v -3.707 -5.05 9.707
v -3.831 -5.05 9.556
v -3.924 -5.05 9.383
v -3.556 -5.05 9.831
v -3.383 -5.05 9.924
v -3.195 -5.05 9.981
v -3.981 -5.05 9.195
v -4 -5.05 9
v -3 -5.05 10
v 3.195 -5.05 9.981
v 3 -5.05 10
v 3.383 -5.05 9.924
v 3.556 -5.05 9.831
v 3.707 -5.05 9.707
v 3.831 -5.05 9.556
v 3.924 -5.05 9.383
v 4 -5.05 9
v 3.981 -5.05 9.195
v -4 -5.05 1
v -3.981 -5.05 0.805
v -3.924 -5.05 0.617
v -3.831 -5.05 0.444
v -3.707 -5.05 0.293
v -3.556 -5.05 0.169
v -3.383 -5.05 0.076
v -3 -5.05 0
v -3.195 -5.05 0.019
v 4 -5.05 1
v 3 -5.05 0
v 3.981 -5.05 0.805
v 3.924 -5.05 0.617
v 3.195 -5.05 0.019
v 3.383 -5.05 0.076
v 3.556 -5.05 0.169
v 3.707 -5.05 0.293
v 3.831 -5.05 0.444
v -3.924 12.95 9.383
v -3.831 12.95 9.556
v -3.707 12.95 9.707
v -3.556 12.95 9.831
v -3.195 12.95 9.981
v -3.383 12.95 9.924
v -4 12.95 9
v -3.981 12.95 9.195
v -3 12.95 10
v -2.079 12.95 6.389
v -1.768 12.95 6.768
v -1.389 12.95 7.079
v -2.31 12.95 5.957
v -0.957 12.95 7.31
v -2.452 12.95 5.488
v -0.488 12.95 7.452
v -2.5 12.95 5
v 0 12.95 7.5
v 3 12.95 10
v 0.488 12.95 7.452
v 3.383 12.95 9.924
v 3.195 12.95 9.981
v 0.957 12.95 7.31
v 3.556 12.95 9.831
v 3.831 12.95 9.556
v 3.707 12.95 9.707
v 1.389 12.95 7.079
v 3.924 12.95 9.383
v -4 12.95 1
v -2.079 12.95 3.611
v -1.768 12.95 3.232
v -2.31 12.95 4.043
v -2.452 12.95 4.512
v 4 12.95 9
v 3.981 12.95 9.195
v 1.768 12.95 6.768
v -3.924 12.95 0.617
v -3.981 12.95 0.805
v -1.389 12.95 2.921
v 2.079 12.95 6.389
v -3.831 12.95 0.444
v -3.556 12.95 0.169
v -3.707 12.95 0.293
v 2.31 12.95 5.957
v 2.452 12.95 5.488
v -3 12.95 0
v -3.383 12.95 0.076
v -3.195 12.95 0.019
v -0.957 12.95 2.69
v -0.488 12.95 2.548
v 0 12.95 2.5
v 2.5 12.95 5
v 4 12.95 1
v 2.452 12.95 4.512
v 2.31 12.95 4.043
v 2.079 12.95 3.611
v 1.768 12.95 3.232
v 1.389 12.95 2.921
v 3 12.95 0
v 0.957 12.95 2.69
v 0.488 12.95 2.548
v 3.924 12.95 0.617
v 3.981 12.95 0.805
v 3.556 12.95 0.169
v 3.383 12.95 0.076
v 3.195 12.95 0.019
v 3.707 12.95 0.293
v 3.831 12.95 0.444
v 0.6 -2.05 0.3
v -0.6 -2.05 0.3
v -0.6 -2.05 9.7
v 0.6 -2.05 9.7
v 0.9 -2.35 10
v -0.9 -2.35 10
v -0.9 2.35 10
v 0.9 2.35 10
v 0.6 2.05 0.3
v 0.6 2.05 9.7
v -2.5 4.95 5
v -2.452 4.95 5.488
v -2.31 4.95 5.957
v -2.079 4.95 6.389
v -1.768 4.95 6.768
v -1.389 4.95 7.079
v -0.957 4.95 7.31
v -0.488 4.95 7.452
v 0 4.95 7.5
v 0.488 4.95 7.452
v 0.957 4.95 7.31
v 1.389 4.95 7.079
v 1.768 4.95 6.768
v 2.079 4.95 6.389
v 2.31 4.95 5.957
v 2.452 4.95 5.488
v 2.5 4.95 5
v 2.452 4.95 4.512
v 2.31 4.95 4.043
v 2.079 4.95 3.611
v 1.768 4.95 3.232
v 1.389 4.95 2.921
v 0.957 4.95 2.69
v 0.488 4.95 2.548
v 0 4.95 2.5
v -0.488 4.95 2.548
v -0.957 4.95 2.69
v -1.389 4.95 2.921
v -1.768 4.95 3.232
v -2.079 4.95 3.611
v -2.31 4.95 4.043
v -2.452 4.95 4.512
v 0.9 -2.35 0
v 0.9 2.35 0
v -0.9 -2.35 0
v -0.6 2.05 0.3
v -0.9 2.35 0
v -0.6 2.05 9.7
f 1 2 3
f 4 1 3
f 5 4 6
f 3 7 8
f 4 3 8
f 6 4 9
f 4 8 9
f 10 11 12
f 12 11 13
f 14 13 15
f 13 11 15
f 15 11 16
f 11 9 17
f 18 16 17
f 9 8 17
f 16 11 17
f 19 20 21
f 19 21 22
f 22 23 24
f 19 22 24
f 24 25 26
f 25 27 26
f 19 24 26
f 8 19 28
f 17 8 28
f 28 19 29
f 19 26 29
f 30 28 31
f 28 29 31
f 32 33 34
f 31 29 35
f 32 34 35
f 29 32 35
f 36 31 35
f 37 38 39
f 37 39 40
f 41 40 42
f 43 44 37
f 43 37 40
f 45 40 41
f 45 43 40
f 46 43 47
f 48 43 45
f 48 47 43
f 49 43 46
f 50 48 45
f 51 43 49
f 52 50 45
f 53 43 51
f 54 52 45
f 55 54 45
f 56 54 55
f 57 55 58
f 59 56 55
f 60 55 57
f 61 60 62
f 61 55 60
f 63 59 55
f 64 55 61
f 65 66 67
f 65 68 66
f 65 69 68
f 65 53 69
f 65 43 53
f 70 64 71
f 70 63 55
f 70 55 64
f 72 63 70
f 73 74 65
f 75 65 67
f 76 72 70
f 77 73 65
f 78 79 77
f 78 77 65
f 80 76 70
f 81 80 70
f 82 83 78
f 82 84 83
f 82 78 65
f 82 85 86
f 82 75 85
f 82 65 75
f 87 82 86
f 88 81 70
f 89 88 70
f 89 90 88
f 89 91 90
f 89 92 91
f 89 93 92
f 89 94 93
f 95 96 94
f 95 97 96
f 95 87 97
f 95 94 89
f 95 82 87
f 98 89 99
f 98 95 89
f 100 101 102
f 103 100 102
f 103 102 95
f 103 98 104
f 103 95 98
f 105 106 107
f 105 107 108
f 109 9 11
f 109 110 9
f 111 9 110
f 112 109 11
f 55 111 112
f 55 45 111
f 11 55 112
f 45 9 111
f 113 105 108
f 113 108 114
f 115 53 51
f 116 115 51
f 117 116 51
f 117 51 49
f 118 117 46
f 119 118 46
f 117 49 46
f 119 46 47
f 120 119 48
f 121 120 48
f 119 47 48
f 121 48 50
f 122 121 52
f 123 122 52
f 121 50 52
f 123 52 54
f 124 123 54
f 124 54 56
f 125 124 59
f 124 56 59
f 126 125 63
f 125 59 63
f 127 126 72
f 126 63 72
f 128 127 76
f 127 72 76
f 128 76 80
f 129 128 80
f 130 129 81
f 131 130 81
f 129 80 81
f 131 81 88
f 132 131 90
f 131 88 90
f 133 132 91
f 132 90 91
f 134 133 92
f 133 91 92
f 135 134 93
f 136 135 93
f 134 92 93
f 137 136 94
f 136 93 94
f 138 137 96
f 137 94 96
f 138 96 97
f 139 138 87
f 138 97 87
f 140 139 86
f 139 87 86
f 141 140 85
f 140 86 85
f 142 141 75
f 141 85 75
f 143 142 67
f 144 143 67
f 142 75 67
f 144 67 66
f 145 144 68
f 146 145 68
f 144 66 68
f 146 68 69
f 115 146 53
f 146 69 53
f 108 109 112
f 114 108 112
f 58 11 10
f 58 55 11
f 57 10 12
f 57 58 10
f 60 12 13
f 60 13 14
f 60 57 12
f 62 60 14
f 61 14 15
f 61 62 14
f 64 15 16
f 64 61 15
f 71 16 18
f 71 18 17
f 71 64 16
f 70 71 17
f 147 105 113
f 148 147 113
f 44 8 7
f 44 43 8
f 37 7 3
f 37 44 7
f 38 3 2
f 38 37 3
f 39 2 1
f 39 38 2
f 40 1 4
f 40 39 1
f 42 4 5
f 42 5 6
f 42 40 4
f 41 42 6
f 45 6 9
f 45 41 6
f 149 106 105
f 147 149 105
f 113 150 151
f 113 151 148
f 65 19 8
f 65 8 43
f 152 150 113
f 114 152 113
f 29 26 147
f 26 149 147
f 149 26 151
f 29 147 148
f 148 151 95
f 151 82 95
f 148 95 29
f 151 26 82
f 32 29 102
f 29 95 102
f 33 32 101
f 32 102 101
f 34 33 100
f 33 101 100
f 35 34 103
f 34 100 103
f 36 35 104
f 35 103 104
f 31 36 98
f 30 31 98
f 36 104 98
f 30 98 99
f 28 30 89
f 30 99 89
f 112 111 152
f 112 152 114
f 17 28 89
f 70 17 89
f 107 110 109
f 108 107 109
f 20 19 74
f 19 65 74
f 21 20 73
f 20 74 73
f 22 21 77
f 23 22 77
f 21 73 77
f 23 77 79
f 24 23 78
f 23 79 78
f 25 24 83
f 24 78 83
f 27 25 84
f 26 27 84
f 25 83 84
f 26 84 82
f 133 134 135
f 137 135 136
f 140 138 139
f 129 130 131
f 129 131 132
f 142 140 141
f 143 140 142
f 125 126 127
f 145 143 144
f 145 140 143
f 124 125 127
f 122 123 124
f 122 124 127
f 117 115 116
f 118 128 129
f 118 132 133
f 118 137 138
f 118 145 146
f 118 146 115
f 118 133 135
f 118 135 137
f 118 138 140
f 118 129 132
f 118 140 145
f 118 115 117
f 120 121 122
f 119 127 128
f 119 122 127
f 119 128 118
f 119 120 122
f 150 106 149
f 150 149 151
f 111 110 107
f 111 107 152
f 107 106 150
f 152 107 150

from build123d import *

# Parameters (mm, degrees)
SKETCH016_W     = 8
SKETCH016_H     = 18
SKETCH016_W_2   = 1.2
SKETCH016_H_2   = 4.1
PAD011_DEPTH    = 10
SKETCH017_R     = 2.5
POCKET009_DEPTH = 8
FILLET001_R     = 1
CHAMFER001_SIZE = 0.3
CHAMFER002_SIZE = 0.3


with BuildPart() as part:
    # Sketch016 → Pad011 (new body)
    with BuildSketch(Plane.XY):
        with Locations((0, 3.95)):
            Rectangle(SKETCH016_W, SKETCH016_H)
        Rectangle(SKETCH016_W_2, SKETCH016_H_2, mode=Mode.SUBTRACT)
    extrude(amount=PAD011_DEPTH)

    # Sketch017 (on Face1 of Pad011) → Pocket009 (cut)
    with BuildSketch(Plane(origin=(0, 12.95, 0), x_dir=(-1, 0, 0), z_dir=(0, 1, 0))):
        with Locations((0, 5)):
            Circle(SKETCH017_R)
    extrude(amount=-POCKET009_DEPTH, mode=Mode.SUBTRACT)

    # Fillet001
    fillet001_edges = [part.edges().sort_by_distance(p)[0] for p in [
        (4, 3.95, 0),
        (4, 3.95, 10),
        (-4, 3.95, 10),
        (-4, 3.95, 0),
    ]]
    fillet(fillet001_edges, radius=FILLET001_R)

    # Chamfer001
    chamfer001_edges = [part.edges().sort_by_distance(p)[0] for p in [
        (0, -2.05, 0),
        (0.6, 0, 0),
        (0, 2.05, 0),
        (-0.6, 0, 0),
    ]]
    chamfer(chamfer001_edges, length=CHAMFER001_SIZE)

    # Chamfer002
    chamfer002_edges = [part.edges().sort_by_distance(p)[0] for p in [
        (-0.6, 0, 10),
        (0, -2.05, 10),
        (0.6, 0, 10),
        (0, 2.05, 10),
    ]]
    chamfer(chamfer002_edges, length=CHAMFER002_SIZE)


solid = part.part
